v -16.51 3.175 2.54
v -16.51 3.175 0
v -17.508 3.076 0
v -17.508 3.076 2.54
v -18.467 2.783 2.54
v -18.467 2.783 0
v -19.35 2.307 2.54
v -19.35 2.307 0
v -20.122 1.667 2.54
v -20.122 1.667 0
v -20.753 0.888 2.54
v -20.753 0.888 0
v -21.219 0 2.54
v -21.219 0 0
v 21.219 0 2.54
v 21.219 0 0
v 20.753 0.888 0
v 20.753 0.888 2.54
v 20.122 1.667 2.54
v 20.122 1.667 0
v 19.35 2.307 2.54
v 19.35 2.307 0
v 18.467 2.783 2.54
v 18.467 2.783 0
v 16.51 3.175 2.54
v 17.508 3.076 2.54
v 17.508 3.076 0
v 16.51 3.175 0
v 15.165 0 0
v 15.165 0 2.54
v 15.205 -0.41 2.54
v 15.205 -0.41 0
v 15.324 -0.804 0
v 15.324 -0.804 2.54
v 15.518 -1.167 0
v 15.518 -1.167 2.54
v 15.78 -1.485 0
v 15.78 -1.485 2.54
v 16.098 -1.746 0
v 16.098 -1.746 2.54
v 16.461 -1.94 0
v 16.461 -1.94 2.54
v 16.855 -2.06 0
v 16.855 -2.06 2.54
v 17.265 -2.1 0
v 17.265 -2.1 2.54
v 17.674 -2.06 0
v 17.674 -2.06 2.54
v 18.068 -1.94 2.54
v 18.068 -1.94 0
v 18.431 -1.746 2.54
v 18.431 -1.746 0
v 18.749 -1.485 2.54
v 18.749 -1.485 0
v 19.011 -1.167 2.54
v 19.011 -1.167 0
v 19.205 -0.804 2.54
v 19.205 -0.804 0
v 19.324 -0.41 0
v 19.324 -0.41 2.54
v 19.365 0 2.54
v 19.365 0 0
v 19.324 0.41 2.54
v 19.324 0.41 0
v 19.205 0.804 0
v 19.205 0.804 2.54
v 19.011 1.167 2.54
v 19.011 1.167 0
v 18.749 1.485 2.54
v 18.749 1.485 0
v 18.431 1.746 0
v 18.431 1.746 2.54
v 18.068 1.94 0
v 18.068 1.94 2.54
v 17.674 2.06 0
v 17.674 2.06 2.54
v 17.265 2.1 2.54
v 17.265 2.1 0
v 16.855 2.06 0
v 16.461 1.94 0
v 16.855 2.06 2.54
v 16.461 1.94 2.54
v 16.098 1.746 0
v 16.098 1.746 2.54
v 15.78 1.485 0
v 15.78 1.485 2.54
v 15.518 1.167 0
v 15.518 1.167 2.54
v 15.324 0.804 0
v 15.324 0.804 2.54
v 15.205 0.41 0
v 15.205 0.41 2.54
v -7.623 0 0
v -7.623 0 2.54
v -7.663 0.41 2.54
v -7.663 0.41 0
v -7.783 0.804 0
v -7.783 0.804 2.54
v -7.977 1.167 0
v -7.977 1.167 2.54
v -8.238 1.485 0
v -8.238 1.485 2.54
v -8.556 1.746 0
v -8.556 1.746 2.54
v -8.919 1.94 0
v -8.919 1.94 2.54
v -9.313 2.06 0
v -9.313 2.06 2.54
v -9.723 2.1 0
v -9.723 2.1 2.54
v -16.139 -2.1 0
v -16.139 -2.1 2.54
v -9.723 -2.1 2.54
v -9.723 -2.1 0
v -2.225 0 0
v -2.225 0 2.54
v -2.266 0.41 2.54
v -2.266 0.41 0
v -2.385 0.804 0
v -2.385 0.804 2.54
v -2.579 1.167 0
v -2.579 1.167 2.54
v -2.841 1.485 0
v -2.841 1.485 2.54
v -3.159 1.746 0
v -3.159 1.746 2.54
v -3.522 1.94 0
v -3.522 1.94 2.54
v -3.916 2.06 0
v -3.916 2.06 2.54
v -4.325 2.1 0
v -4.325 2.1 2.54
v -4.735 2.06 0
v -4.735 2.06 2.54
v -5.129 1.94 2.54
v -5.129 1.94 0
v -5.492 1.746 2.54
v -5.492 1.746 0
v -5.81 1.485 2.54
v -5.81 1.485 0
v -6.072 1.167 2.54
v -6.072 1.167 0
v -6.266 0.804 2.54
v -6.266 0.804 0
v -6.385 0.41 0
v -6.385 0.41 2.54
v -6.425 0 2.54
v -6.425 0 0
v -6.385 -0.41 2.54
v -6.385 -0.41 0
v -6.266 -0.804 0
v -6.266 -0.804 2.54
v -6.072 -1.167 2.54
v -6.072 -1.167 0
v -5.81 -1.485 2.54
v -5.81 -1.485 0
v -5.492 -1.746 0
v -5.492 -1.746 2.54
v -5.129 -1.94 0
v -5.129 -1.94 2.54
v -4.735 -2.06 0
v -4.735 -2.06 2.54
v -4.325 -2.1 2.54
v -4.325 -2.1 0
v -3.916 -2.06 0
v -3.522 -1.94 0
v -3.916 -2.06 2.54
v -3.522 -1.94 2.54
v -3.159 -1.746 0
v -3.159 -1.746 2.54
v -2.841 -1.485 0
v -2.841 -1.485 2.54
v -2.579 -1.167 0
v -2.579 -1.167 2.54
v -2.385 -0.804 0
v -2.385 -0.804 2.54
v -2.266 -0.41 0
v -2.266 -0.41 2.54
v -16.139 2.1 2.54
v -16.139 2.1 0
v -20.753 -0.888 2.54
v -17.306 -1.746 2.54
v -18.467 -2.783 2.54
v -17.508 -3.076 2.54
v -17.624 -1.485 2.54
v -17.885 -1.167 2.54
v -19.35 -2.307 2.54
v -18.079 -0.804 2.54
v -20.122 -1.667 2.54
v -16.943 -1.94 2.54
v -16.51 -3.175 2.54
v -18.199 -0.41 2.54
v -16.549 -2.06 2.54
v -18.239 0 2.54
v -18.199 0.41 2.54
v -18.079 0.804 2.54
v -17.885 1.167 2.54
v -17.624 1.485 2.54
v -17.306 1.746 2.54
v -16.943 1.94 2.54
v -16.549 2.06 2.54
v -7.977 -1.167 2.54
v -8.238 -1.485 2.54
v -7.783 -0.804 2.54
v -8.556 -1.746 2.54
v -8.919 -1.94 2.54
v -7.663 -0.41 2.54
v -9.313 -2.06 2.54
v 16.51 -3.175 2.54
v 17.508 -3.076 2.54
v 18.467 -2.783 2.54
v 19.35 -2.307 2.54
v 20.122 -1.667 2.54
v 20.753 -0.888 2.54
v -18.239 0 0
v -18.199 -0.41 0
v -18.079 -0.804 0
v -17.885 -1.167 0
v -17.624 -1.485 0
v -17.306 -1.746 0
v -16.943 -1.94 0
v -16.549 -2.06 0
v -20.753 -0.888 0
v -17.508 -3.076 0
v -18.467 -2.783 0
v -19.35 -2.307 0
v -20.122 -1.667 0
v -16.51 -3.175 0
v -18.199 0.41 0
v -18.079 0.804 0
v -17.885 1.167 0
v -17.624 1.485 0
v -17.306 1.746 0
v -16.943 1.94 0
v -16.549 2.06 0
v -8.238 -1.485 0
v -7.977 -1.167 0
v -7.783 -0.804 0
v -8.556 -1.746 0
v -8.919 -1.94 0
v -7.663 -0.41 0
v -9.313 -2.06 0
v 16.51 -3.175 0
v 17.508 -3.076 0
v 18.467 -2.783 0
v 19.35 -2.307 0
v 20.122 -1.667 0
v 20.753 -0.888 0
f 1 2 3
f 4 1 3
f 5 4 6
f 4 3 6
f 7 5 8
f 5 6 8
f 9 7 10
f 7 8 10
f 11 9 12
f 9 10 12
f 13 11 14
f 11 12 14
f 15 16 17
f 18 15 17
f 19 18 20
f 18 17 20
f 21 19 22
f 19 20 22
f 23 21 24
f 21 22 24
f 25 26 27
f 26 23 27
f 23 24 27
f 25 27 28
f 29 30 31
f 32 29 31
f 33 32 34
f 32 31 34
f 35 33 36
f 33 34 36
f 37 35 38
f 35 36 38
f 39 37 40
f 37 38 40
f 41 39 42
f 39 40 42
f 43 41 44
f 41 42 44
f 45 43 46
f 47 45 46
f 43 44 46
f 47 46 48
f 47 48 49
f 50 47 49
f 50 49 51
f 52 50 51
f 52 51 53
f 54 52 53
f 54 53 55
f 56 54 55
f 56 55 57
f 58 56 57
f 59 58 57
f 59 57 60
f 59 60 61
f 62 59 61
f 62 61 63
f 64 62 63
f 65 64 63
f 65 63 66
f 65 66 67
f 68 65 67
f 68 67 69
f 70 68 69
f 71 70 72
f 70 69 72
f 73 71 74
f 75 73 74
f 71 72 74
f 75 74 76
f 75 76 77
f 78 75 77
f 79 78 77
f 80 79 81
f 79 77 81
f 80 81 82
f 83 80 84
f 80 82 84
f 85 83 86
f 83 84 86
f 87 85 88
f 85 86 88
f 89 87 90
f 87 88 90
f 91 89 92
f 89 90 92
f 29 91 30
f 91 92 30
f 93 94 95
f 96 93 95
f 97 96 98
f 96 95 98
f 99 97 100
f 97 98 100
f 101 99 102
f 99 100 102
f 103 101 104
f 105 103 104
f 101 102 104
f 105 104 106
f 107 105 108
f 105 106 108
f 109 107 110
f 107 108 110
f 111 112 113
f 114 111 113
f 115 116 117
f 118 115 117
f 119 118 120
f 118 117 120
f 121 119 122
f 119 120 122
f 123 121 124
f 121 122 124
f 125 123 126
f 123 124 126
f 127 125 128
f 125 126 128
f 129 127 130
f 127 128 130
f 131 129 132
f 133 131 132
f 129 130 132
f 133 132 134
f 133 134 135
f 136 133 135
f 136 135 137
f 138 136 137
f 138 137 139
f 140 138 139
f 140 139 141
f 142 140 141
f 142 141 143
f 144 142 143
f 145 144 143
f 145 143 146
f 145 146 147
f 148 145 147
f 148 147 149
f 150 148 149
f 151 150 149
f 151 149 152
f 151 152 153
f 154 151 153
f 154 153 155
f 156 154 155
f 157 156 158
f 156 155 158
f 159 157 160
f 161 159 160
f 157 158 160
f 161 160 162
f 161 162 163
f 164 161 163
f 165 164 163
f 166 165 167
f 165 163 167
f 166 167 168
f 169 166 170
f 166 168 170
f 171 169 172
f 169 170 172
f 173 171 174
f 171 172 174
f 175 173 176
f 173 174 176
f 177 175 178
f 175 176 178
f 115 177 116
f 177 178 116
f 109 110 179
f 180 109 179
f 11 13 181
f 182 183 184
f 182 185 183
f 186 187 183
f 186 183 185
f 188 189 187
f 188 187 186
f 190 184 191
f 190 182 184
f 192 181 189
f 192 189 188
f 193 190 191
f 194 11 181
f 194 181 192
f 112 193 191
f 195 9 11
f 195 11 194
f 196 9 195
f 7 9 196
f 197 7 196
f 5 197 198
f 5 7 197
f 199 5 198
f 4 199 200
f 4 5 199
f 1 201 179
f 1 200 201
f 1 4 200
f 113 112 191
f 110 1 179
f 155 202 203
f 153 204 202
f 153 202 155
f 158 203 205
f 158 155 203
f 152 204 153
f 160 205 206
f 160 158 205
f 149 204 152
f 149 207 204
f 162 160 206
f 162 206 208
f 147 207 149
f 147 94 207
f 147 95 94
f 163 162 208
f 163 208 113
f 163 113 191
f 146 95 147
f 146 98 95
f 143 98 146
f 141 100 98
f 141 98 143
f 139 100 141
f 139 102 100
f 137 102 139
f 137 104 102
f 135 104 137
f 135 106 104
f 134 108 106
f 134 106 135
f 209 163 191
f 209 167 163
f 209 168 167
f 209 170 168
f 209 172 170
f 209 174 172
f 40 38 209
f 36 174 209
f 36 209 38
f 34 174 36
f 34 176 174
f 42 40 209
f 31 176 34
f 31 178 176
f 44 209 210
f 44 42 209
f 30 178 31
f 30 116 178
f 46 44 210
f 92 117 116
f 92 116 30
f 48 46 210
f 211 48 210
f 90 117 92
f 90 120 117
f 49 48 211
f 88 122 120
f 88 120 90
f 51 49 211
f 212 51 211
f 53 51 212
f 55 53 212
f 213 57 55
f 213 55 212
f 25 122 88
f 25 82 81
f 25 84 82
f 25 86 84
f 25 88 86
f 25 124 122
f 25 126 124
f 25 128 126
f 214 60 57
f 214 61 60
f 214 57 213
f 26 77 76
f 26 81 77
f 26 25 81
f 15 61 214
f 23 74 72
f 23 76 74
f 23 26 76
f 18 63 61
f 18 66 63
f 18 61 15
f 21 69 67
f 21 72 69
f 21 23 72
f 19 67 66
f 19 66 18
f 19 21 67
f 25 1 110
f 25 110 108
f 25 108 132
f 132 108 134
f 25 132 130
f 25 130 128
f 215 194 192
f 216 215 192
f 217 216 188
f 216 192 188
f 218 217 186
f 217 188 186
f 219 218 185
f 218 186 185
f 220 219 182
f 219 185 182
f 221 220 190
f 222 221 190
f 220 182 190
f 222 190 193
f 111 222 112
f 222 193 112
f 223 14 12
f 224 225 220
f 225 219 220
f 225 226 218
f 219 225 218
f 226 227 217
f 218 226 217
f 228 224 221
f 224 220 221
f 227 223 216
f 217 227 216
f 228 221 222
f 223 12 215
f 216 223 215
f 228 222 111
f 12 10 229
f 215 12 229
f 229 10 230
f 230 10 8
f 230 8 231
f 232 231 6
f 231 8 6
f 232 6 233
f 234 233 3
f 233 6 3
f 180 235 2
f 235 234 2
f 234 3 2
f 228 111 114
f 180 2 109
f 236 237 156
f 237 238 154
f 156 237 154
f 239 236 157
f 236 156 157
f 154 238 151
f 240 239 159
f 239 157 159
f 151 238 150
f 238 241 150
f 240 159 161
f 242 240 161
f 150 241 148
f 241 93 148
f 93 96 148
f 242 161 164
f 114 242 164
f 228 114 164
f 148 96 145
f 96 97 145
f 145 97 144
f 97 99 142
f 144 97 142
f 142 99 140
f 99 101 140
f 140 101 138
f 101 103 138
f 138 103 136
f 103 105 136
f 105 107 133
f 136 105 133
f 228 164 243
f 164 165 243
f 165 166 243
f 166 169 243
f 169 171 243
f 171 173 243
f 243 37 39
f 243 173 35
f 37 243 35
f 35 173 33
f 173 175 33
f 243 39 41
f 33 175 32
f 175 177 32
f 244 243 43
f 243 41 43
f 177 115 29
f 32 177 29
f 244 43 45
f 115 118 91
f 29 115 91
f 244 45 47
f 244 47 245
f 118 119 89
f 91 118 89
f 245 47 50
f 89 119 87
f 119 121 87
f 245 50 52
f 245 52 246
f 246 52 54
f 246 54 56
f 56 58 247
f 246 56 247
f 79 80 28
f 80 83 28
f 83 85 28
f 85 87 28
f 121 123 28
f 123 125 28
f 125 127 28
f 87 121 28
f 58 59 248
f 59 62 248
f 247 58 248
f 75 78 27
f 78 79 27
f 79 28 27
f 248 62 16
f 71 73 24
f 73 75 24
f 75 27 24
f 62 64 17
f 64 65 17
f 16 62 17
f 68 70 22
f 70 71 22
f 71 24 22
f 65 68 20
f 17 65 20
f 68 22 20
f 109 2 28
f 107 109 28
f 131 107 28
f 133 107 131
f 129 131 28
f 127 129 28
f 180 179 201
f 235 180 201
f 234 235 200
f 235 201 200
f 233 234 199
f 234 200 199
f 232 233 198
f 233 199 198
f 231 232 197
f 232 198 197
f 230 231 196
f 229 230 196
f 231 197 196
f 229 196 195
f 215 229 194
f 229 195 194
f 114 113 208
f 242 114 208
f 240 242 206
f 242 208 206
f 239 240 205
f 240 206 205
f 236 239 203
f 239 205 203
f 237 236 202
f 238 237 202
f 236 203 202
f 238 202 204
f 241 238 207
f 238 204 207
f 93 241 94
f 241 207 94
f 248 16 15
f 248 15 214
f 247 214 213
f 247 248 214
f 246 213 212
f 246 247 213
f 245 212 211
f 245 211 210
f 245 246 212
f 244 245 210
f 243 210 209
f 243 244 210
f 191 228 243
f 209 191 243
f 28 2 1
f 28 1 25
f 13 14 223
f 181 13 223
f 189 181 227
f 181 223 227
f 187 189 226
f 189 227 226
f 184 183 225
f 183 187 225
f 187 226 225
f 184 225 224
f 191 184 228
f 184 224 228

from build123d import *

# Parameters (mm, degrees)
F0_W        = 43.18
F0_H        = 6.35
F1_DEPTH    = 2.54
F2_T1_DEPTH = 27.94
F4_DEPTH    = 2.541


# Not quite as in the source:
# - a fillet or chamfer that OpenCascade refuses, or shapes differently, is made with other operations: its cross-section is extruded or revolved along the edge and cut away or added


with BuildPart() as f1:
    # F0 (on Top) → F1 (new body)
    with BuildSketch(Plane.XY):
        Rectangle(F0_W, F0_H)
    extrude(amount=F1_DEPTH)

    # F2: fillet of radius 5.08 on 4 edges, made by hand

    # F2_s2 → F2_t1 (cut)
    with BuildSketch(Plane.XY.offset(-12.7)):
        with BuildLine():
            ThreePointArc((21.59, 1.905), (20.1021024484, -1.6871024484), (16.51, -3.175))
            Line((16.51, -3.175), (21.59, -3.175))
            Line((21.59, -3.175), (21.59, 1.905))
        make_face()
        with BuildLine():
            ThreePointArc((21.59, -1.905), (20.1021024484, 1.6871024484), (16.51, 3.175))
            Line((16.51, 3.175), (21.59, 3.175))
            Line((21.59, 3.175), (21.59, -1.905))
        make_face()
        with BuildLine():
            ThreePointArc((-16.51, 3.175), (-20.1021024484, 1.6871024484), (-21.59, -1.905))
            Line((-21.59, -1.905), (-21.59, 3.175))
            Line((-21.59, 3.175), (-16.51, 3.175))
        make_face()
        with BuildLine():
            ThreePointArc((-21.59, 1.905), (-20.1021024484, -1.6871024484), (-16.51, -3.175))
            Line((-16.51, -3.175), (-21.59, -3.175))
            Line((-21.59, -3.175), (-21.59, 1.905))
        make_face()
    extrude(amount=F2_T1_DEPTH, mode=Mode.SUBTRACT)

    # F3 (on face) → F4 (cut, through all)
    with BuildSketch(Plane.XY.offset(2.54)):
        with BuildLine():
            Line((15.1645667607, 0), (19.3645667607, 0))
            ThreePointArc((19.3645667607, 0), (17.2645667607, 2.1), (15.1645667607, 0))
        make_face()
        with BuildLine():
            ThreePointArc((-9.7229412393, -2.1), (-8.2380169988, -1.4849242405), (-7.6229412393, 0))
            Line((-7.6229412393, 0), (-18.2392860393, 0))
            ThreePointArc((-18.2392860393, 0), (-17.6242102798, -1.4849242405), (-16.1392860393, -2.1))
            Line((-16.1392860393, -2.1), (-9.7229412393, -2.1))
        make_face()
        with BuildLine():
            Line((-18.2392860393, 0), (-7.6229412393, 0))
            ThreePointArc((-7.6229412393, 0), (-8.2380169988, 1.4849242405), (-9.7229412393, 2.1))
            Line((-9.7229412393, 2.1), (-16.1392860393, 2.1))
            ThreePointArc((-16.1392860393, 2.1), (-17.6242102798, 1.4849242405), (-18.2392860393, 0))
        make_face()
        with BuildLine():
            ThreePointArc((-6.4254332393, 0), (-4.3254332393, -2.1), (-2.2254332393, 0))
            Line((-2.2254332393, 0), (-6.4254332393, 0))
        make_face()
        with BuildLine():
            Line((-6.4254332393, 0), (-2.2254332393, 0))
            ThreePointArc((-2.2254332393, 0), (-4.3254332393, 2.1), (-6.4254332393, 0))
        make_face()
        with BuildLine():
            ThreePointArc((15.1645667607, 0), (17.2645667607, -2.1), (19.3645667607, 0))
            Line((19.3645667607, 0), (15.1645667607, 0))
        make_face()
    extrude(amount=-F4_DEPTH, mode=Mode.SUBTRACT)


solid = f1.part
